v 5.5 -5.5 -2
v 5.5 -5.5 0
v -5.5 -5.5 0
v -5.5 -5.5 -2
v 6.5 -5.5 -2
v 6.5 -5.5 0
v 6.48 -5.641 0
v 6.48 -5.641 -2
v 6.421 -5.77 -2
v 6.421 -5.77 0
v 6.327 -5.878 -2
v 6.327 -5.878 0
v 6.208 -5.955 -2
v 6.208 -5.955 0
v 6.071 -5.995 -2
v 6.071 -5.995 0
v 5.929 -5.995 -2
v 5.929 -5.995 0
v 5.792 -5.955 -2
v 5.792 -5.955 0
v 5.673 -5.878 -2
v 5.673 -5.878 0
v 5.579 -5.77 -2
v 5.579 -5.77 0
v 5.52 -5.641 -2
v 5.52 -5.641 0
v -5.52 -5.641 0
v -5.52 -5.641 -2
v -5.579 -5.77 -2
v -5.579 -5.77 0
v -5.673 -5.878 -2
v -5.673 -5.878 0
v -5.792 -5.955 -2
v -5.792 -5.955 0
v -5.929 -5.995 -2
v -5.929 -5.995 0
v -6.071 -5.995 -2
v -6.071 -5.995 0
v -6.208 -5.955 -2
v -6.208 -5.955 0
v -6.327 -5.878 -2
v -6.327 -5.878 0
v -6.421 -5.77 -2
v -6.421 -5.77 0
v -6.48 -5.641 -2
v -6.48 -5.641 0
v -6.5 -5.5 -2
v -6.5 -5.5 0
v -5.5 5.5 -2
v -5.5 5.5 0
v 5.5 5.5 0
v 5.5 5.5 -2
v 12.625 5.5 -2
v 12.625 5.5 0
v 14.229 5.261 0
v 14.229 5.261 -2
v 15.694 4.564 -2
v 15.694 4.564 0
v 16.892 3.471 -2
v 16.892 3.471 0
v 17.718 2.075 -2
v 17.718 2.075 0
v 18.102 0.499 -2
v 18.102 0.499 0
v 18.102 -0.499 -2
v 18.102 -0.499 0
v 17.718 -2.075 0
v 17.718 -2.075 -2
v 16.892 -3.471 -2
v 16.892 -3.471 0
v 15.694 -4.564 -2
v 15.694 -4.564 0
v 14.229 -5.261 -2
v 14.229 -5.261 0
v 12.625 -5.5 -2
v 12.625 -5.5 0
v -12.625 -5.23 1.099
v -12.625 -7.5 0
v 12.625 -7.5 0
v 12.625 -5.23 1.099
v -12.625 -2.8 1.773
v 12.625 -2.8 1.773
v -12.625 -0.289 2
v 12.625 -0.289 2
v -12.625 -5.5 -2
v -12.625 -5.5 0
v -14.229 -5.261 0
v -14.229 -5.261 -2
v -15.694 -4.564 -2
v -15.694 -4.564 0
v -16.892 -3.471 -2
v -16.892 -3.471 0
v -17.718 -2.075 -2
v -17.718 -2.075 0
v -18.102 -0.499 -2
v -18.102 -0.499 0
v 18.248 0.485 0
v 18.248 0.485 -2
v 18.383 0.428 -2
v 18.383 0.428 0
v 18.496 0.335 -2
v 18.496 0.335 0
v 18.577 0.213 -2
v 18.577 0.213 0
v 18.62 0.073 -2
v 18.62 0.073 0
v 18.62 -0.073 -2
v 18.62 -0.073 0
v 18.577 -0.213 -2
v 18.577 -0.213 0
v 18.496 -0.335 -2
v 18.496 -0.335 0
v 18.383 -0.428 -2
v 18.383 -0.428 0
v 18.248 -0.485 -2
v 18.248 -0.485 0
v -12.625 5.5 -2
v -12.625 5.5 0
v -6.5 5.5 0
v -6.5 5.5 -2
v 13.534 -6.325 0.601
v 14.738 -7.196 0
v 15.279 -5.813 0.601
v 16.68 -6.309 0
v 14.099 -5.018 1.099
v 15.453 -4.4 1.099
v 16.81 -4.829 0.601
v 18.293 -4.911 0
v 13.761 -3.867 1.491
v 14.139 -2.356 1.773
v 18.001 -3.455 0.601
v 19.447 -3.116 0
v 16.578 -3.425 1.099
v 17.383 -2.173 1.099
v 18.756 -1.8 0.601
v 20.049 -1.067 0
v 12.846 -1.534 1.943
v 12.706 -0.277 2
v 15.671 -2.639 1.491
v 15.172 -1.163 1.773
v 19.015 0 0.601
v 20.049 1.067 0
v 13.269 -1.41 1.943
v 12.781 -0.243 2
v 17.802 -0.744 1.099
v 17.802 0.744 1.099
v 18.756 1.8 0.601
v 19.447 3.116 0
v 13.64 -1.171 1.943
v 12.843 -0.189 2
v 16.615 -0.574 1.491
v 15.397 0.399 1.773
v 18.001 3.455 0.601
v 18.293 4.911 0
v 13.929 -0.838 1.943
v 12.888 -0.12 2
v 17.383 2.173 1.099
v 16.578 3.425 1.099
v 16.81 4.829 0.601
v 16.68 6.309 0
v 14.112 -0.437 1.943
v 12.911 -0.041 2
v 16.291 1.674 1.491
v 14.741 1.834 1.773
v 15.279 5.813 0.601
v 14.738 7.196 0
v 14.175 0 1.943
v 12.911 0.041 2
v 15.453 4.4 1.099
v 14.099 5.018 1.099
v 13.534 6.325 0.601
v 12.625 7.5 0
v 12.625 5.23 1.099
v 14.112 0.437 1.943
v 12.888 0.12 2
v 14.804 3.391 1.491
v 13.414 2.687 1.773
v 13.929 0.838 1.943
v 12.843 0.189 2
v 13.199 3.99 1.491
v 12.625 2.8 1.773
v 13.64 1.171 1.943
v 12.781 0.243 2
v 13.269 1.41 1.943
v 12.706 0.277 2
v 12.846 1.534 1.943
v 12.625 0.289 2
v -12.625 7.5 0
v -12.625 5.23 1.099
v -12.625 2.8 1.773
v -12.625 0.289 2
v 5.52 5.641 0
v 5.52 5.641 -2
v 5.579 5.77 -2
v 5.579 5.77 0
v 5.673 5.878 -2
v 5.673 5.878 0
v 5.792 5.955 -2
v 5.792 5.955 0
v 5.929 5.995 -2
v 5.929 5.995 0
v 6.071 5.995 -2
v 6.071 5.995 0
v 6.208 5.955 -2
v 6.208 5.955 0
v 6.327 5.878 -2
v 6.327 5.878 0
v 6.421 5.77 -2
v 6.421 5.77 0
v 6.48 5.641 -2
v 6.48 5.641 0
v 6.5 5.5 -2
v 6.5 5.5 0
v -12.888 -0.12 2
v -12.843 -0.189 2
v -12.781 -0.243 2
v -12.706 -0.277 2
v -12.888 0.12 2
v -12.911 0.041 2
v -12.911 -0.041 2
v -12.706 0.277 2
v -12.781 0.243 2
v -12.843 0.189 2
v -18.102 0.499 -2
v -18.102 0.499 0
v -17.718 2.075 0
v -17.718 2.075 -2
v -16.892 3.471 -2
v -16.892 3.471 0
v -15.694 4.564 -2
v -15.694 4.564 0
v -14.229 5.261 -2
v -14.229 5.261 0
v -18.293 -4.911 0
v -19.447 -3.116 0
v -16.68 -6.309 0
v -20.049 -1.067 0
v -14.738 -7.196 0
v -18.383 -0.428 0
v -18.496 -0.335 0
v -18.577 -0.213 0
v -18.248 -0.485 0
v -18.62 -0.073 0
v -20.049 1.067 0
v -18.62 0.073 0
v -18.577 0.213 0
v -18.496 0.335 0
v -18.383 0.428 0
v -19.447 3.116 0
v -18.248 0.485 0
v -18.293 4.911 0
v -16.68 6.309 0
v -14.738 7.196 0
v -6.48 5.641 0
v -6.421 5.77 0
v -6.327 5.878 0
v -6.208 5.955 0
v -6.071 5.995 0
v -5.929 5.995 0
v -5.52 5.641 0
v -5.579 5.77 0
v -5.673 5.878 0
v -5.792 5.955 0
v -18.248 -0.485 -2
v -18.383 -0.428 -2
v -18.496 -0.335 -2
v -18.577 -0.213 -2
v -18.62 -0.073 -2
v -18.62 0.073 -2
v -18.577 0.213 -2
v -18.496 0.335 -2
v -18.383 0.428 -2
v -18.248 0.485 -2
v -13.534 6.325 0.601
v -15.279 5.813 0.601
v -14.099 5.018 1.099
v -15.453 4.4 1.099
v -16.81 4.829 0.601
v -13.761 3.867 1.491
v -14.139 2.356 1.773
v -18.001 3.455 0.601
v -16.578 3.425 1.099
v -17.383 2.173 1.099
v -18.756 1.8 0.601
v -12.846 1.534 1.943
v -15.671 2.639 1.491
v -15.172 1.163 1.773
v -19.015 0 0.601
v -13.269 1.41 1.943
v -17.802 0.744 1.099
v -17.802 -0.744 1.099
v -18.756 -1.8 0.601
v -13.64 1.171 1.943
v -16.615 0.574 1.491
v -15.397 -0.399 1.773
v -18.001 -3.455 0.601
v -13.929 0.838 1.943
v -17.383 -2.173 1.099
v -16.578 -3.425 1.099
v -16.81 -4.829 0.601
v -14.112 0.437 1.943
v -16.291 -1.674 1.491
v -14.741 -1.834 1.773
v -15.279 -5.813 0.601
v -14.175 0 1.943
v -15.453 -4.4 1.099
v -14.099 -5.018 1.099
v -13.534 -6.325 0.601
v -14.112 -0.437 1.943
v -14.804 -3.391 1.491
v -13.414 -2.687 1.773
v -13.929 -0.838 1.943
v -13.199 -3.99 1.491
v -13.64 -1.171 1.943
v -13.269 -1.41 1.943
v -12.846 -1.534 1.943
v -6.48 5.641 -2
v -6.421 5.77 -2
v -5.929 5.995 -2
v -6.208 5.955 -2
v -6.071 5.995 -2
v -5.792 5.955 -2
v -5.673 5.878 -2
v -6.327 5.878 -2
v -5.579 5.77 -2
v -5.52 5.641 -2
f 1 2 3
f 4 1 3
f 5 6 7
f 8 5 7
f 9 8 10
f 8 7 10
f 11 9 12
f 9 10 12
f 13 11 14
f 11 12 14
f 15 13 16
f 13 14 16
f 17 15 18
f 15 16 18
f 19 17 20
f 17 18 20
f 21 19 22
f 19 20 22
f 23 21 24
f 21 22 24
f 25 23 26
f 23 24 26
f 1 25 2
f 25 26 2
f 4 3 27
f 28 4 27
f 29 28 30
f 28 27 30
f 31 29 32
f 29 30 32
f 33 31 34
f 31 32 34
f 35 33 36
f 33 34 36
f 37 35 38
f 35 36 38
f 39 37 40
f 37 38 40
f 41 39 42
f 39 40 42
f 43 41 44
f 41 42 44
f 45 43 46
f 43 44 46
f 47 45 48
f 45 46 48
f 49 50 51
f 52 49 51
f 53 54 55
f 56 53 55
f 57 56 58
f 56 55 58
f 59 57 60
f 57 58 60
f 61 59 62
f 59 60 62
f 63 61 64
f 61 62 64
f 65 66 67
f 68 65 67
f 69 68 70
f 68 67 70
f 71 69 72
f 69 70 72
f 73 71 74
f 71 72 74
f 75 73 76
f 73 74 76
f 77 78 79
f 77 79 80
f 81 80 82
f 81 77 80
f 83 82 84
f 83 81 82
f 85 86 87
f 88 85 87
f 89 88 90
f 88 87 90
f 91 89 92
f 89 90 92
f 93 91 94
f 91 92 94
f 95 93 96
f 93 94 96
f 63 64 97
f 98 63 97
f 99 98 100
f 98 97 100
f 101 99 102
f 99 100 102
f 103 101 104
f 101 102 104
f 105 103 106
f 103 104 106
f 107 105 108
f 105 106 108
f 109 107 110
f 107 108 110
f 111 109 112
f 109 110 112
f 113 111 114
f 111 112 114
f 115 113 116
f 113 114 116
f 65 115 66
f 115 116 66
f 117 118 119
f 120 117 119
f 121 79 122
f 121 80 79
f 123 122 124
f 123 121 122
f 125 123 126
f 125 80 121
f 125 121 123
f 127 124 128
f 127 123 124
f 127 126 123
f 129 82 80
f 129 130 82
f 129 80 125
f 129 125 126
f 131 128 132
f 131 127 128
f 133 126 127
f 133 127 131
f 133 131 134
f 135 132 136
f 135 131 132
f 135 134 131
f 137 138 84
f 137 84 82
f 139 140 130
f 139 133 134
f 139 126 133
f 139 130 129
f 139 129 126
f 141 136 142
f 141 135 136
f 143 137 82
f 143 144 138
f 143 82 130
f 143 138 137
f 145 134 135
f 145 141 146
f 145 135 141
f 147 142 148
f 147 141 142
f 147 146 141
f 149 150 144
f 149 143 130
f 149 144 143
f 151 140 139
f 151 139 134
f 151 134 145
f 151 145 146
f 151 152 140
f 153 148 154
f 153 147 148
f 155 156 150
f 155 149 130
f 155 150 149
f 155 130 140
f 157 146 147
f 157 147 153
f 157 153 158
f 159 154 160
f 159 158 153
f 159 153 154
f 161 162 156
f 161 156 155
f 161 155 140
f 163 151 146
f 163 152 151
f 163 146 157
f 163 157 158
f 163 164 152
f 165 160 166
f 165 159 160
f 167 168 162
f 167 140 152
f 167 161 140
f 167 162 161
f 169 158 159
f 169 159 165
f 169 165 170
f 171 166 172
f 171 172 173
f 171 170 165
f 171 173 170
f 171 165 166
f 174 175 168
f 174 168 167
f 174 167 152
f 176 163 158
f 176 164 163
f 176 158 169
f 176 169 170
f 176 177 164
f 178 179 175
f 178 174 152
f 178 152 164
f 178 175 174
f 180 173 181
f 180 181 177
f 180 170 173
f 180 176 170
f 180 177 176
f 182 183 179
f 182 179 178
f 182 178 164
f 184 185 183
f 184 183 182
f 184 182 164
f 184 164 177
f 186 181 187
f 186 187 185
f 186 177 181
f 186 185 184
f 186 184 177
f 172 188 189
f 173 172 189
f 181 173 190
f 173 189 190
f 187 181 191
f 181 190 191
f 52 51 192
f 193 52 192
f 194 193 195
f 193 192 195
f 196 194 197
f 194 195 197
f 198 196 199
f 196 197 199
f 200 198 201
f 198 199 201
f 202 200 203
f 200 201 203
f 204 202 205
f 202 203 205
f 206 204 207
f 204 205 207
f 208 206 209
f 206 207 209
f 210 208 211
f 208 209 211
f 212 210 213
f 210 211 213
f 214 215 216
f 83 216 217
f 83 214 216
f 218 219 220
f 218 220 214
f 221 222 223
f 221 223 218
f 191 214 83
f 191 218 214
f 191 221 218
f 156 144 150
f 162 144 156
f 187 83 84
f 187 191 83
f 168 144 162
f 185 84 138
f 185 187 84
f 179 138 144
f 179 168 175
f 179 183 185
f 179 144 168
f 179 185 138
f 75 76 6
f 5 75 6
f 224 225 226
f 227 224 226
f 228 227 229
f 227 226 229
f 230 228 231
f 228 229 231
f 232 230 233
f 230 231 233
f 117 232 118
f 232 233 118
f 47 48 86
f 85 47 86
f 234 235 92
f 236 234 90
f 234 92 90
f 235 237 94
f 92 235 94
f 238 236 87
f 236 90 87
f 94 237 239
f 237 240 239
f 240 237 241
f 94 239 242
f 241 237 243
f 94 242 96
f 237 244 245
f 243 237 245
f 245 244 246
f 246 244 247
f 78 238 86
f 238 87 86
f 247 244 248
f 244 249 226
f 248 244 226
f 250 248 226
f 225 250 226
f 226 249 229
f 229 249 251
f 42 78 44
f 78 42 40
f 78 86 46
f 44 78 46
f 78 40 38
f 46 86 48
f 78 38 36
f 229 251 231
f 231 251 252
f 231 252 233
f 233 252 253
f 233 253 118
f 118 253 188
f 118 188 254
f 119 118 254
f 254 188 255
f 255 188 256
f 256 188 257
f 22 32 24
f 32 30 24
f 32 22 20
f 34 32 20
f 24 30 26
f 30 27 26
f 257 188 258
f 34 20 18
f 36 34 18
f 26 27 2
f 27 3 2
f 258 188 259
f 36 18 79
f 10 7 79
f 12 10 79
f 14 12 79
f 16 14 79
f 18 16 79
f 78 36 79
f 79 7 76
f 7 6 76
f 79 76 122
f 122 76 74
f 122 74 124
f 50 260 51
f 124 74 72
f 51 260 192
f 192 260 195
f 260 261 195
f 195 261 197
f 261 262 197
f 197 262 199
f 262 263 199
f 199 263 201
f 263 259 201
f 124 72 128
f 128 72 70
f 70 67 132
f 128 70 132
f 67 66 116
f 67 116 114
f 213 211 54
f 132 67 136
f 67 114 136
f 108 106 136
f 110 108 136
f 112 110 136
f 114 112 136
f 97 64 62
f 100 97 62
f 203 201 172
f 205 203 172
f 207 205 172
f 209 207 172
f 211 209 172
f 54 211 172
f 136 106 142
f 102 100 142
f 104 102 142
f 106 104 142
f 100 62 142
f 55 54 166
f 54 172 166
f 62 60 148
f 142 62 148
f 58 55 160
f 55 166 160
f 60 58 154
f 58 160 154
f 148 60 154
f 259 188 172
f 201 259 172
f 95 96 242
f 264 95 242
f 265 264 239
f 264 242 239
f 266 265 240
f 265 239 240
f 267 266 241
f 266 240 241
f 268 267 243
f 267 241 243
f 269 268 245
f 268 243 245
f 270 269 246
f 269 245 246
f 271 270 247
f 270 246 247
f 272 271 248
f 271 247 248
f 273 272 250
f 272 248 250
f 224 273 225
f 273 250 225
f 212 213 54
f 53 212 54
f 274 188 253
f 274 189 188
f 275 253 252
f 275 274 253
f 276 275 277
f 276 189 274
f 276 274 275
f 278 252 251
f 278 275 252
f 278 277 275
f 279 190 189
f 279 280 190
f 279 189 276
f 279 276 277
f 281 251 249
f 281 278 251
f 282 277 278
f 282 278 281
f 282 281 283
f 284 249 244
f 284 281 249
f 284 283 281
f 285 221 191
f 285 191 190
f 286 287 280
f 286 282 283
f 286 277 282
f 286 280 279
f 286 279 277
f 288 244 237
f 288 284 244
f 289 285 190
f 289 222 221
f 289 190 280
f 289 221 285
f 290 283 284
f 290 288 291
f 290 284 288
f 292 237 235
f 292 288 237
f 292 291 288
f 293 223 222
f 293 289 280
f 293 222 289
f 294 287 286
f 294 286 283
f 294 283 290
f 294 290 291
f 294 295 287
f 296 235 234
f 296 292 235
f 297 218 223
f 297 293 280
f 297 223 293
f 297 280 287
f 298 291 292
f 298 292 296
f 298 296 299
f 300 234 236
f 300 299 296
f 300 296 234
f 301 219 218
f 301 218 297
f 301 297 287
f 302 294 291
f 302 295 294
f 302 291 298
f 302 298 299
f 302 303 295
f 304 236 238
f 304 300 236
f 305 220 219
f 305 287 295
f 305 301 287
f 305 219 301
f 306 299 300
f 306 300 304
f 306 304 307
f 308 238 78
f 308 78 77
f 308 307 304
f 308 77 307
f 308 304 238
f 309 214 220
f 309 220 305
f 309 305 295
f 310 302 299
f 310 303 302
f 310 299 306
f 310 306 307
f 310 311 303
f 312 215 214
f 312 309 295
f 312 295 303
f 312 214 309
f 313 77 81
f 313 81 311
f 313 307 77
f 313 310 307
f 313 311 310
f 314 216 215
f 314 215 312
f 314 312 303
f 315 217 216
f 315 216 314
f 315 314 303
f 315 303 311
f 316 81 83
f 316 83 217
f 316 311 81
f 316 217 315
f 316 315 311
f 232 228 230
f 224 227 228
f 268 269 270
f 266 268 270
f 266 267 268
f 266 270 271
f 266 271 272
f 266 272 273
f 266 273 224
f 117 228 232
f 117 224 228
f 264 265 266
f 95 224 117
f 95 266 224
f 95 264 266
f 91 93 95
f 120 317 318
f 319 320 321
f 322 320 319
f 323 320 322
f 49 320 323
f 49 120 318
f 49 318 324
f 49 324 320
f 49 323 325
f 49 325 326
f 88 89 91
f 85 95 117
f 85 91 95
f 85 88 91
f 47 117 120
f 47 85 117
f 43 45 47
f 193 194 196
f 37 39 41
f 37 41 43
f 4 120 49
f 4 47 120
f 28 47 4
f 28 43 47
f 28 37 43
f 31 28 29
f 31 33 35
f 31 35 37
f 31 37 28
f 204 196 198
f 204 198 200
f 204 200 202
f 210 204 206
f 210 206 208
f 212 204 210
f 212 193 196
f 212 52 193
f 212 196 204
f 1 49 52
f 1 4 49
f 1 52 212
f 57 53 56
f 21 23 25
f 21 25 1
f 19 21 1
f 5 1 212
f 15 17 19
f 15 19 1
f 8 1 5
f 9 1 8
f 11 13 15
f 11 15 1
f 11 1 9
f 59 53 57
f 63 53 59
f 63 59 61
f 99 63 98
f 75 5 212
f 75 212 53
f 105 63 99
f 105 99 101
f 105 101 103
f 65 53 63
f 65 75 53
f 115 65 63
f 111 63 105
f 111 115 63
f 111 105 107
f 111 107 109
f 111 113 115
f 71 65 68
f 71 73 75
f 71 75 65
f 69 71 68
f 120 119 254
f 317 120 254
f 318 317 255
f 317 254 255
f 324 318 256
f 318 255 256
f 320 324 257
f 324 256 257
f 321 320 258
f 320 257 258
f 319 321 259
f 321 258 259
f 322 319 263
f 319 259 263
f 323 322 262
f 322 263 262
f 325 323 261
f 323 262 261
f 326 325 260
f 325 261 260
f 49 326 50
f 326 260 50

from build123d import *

# Parameters (mm, degrees)
F1_DEPTH    = 2
F2_T1_DEPTH = 25.25
F2_T4_ANGLE = 180
F2_T6_ANGLE = 180
F4_DEPTH    = 2


# Not quite as in the source:
# - a fillet or chamfer that OpenCascade refuses, or shapes differently, is made with other operations: its cross-section is extruded or revolved along the edge and cut away or added


with BuildPart() as f1:
    # F0 (on Top) → F1 (new body)
    with BuildSketch(Plane.XY):
        with BuildLine():
            Line((-12.625, -7.5), (12.625, -7.5))
            ThreePointArc((12.625, -7.5), (20.125, 0), (12.625, 7.5))
            Line((12.625, 7.5), (-12.625, 7.5))
            ThreePointArc((-12.625, 7.5), (-20.125, 0), (-12.625, -7.5))
        make_face()
    extrude(amount=F1_DEPTH)

    # F2: fillet of radius 14 on 1 edges, made by hand

    # F2_s2 → F2_t1 (cut)
    with BuildSketch(Plane.YZ.offset(-12.625)):
        with BuildLine():
            ThreePointArc((7.5, 0), (4.0305548358, 1.4907375632), (0.2888974491, 2))
            Line((0.2888974491, 2), (0.2888974491, 2.28))
            Line((0.2888974491, 2.28), (7.5, 2.28))
            Line((7.5, 2.28), (7.78, 2))
            ThreePointArc((7.78, 2), (7.78, 1), (7.644222051, 0.24))
            Line((7.644222051, 0.24), (7.5, 0))
        make_face()
        with BuildLine():
            ThreePointArc((-7.5, 0), (-4.0305548358, 1.4907375632), (-0.2888974491, 2))
            Line((-0.2888974491, 2), (-0.2888974491, 2.28))
            Line((-0.2888974491, 2.28), (-7.5, 2.28))
            Line((-7.5, 2.28), (-7.78, 2))
            ThreePointArc((-7.78, 2), (-7.78, 1), (-7.644222051, 0.24))
            Line((-7.644222051, 0.24), (-7.5, 0))
        make_face()
    extrude(amount=F2_T1_DEPTH, mode=Mode.SUBTRACT)

    # F2_s3 → F2_t4 (revolve, cut)
    with BuildSketch(Plane.YZ.offset(12.625)):
        with BuildLine():
            ThreePointArc((-7.5, 0), (-4.0305548358, 1.4907375632), (-0.2888974491, 2))
            Line((-0.2888974491, 2), (-0.2888974491, 2.28))
            Line((-0.2888974491, 2.28), (-7.5, 2.28))
            Line((-7.5, 2.28), (-7.78, 2))
            ThreePointArc((-7.78, 2), (-7.78, 1), (-7.644222051, 0.24))
            Line((-7.644222051, 0.24), (-7.5, 0))
        make_face()
    revolve(axis=Axis((12.625, 0, 2), (0, 0, 1)), revolution_arc=F2_T4_ANGLE, mode=Mode.SUBTRACT)

    # F2_s5 → F2_t6 (revolve, cut)
    with BuildSketch(Plane.YZ.offset(-12.625)):
        with BuildLine():
            ThreePointArc((7.5, 0), (4.0305548358, 1.4907375632), (0.2888974491, 2))
            Line((0.2888974491, 2), (0.2888974491, 2.28))
            Line((0.2888974491, 2.28), (7.5, 2.28))
            Line((7.5, 2.28), (7.78, 2))
            ThreePointArc((7.78, 2), (7.78, 1), (7.644222051, 0.24))
            Line((7.644222051, 0.24), (7.5, 0))
        make_face()
    revolve(axis=Axis((-12.625, 0, 2), (0, 0, 1)), revolution_arc=F2_T6_ANGLE, mode=Mode.SUBTRACT)

    # F3 (on face) → F4 (join)
    with BuildSketch(Plane(origin=(0, 0, 0), x_dir=(1, 0, 0), z_dir=(0, 0, -1))):
        with BuildLine():
            ThreePointArc((18.1022727273, 0.499483204), (16.3332908717, 4.0618442623), (12.625, 5.5))
            Line((12.625, 5.5), (6.5, 5.5))
            ThreePointArc((6.5, 5.5), (6, 6), (5.5, 5.5))
            Line((5.5, 5.5), (-5.5, 5.5))
            ThreePointArc((-5.5, 5.5), (-6, 6), (-6.5, 5.5))
            Line((-6.5, 5.5), (-12.625, 5.5))
            ThreePointArc((-12.625, 5.5), (-16.3332908717, 4.0618442623), (-18.1022727273, 0.499483204))
            ThreePointArc((-18.1022727273, 0.499483204), (-18.625, 0), (-18.1022727273, -0.499483204))
            ThreePointArc((-18.1022727273, -0.499483204), (-16.3332908717, -4.0618442623), (-12.625, -5.5))
            Line((-12.625, -5.5), (-6.5, -5.5))
            ThreePointArc((-6.5, -5.5), (-6, -6), (-5.5, -5.5))
            Line((-5.5, -5.5), (5.5, -5.5))
            ThreePointArc((5.5, -5.5), (6, -6), (6.5, -5.5))
            Line((6.5, -5.5), (12.625, -5.5))
            ThreePointArc((12.625, -5.5), (16.3332908717, -4.0618442623), (18.1022727273, -0.499483204))
            ThreePointArc((18.1022727273, -0.499483204), (18.625, 0), (18.1022727273, 0.499483204))
        make_face()
    extrude(amount=F4_DEPTH)


solid = f1.part
